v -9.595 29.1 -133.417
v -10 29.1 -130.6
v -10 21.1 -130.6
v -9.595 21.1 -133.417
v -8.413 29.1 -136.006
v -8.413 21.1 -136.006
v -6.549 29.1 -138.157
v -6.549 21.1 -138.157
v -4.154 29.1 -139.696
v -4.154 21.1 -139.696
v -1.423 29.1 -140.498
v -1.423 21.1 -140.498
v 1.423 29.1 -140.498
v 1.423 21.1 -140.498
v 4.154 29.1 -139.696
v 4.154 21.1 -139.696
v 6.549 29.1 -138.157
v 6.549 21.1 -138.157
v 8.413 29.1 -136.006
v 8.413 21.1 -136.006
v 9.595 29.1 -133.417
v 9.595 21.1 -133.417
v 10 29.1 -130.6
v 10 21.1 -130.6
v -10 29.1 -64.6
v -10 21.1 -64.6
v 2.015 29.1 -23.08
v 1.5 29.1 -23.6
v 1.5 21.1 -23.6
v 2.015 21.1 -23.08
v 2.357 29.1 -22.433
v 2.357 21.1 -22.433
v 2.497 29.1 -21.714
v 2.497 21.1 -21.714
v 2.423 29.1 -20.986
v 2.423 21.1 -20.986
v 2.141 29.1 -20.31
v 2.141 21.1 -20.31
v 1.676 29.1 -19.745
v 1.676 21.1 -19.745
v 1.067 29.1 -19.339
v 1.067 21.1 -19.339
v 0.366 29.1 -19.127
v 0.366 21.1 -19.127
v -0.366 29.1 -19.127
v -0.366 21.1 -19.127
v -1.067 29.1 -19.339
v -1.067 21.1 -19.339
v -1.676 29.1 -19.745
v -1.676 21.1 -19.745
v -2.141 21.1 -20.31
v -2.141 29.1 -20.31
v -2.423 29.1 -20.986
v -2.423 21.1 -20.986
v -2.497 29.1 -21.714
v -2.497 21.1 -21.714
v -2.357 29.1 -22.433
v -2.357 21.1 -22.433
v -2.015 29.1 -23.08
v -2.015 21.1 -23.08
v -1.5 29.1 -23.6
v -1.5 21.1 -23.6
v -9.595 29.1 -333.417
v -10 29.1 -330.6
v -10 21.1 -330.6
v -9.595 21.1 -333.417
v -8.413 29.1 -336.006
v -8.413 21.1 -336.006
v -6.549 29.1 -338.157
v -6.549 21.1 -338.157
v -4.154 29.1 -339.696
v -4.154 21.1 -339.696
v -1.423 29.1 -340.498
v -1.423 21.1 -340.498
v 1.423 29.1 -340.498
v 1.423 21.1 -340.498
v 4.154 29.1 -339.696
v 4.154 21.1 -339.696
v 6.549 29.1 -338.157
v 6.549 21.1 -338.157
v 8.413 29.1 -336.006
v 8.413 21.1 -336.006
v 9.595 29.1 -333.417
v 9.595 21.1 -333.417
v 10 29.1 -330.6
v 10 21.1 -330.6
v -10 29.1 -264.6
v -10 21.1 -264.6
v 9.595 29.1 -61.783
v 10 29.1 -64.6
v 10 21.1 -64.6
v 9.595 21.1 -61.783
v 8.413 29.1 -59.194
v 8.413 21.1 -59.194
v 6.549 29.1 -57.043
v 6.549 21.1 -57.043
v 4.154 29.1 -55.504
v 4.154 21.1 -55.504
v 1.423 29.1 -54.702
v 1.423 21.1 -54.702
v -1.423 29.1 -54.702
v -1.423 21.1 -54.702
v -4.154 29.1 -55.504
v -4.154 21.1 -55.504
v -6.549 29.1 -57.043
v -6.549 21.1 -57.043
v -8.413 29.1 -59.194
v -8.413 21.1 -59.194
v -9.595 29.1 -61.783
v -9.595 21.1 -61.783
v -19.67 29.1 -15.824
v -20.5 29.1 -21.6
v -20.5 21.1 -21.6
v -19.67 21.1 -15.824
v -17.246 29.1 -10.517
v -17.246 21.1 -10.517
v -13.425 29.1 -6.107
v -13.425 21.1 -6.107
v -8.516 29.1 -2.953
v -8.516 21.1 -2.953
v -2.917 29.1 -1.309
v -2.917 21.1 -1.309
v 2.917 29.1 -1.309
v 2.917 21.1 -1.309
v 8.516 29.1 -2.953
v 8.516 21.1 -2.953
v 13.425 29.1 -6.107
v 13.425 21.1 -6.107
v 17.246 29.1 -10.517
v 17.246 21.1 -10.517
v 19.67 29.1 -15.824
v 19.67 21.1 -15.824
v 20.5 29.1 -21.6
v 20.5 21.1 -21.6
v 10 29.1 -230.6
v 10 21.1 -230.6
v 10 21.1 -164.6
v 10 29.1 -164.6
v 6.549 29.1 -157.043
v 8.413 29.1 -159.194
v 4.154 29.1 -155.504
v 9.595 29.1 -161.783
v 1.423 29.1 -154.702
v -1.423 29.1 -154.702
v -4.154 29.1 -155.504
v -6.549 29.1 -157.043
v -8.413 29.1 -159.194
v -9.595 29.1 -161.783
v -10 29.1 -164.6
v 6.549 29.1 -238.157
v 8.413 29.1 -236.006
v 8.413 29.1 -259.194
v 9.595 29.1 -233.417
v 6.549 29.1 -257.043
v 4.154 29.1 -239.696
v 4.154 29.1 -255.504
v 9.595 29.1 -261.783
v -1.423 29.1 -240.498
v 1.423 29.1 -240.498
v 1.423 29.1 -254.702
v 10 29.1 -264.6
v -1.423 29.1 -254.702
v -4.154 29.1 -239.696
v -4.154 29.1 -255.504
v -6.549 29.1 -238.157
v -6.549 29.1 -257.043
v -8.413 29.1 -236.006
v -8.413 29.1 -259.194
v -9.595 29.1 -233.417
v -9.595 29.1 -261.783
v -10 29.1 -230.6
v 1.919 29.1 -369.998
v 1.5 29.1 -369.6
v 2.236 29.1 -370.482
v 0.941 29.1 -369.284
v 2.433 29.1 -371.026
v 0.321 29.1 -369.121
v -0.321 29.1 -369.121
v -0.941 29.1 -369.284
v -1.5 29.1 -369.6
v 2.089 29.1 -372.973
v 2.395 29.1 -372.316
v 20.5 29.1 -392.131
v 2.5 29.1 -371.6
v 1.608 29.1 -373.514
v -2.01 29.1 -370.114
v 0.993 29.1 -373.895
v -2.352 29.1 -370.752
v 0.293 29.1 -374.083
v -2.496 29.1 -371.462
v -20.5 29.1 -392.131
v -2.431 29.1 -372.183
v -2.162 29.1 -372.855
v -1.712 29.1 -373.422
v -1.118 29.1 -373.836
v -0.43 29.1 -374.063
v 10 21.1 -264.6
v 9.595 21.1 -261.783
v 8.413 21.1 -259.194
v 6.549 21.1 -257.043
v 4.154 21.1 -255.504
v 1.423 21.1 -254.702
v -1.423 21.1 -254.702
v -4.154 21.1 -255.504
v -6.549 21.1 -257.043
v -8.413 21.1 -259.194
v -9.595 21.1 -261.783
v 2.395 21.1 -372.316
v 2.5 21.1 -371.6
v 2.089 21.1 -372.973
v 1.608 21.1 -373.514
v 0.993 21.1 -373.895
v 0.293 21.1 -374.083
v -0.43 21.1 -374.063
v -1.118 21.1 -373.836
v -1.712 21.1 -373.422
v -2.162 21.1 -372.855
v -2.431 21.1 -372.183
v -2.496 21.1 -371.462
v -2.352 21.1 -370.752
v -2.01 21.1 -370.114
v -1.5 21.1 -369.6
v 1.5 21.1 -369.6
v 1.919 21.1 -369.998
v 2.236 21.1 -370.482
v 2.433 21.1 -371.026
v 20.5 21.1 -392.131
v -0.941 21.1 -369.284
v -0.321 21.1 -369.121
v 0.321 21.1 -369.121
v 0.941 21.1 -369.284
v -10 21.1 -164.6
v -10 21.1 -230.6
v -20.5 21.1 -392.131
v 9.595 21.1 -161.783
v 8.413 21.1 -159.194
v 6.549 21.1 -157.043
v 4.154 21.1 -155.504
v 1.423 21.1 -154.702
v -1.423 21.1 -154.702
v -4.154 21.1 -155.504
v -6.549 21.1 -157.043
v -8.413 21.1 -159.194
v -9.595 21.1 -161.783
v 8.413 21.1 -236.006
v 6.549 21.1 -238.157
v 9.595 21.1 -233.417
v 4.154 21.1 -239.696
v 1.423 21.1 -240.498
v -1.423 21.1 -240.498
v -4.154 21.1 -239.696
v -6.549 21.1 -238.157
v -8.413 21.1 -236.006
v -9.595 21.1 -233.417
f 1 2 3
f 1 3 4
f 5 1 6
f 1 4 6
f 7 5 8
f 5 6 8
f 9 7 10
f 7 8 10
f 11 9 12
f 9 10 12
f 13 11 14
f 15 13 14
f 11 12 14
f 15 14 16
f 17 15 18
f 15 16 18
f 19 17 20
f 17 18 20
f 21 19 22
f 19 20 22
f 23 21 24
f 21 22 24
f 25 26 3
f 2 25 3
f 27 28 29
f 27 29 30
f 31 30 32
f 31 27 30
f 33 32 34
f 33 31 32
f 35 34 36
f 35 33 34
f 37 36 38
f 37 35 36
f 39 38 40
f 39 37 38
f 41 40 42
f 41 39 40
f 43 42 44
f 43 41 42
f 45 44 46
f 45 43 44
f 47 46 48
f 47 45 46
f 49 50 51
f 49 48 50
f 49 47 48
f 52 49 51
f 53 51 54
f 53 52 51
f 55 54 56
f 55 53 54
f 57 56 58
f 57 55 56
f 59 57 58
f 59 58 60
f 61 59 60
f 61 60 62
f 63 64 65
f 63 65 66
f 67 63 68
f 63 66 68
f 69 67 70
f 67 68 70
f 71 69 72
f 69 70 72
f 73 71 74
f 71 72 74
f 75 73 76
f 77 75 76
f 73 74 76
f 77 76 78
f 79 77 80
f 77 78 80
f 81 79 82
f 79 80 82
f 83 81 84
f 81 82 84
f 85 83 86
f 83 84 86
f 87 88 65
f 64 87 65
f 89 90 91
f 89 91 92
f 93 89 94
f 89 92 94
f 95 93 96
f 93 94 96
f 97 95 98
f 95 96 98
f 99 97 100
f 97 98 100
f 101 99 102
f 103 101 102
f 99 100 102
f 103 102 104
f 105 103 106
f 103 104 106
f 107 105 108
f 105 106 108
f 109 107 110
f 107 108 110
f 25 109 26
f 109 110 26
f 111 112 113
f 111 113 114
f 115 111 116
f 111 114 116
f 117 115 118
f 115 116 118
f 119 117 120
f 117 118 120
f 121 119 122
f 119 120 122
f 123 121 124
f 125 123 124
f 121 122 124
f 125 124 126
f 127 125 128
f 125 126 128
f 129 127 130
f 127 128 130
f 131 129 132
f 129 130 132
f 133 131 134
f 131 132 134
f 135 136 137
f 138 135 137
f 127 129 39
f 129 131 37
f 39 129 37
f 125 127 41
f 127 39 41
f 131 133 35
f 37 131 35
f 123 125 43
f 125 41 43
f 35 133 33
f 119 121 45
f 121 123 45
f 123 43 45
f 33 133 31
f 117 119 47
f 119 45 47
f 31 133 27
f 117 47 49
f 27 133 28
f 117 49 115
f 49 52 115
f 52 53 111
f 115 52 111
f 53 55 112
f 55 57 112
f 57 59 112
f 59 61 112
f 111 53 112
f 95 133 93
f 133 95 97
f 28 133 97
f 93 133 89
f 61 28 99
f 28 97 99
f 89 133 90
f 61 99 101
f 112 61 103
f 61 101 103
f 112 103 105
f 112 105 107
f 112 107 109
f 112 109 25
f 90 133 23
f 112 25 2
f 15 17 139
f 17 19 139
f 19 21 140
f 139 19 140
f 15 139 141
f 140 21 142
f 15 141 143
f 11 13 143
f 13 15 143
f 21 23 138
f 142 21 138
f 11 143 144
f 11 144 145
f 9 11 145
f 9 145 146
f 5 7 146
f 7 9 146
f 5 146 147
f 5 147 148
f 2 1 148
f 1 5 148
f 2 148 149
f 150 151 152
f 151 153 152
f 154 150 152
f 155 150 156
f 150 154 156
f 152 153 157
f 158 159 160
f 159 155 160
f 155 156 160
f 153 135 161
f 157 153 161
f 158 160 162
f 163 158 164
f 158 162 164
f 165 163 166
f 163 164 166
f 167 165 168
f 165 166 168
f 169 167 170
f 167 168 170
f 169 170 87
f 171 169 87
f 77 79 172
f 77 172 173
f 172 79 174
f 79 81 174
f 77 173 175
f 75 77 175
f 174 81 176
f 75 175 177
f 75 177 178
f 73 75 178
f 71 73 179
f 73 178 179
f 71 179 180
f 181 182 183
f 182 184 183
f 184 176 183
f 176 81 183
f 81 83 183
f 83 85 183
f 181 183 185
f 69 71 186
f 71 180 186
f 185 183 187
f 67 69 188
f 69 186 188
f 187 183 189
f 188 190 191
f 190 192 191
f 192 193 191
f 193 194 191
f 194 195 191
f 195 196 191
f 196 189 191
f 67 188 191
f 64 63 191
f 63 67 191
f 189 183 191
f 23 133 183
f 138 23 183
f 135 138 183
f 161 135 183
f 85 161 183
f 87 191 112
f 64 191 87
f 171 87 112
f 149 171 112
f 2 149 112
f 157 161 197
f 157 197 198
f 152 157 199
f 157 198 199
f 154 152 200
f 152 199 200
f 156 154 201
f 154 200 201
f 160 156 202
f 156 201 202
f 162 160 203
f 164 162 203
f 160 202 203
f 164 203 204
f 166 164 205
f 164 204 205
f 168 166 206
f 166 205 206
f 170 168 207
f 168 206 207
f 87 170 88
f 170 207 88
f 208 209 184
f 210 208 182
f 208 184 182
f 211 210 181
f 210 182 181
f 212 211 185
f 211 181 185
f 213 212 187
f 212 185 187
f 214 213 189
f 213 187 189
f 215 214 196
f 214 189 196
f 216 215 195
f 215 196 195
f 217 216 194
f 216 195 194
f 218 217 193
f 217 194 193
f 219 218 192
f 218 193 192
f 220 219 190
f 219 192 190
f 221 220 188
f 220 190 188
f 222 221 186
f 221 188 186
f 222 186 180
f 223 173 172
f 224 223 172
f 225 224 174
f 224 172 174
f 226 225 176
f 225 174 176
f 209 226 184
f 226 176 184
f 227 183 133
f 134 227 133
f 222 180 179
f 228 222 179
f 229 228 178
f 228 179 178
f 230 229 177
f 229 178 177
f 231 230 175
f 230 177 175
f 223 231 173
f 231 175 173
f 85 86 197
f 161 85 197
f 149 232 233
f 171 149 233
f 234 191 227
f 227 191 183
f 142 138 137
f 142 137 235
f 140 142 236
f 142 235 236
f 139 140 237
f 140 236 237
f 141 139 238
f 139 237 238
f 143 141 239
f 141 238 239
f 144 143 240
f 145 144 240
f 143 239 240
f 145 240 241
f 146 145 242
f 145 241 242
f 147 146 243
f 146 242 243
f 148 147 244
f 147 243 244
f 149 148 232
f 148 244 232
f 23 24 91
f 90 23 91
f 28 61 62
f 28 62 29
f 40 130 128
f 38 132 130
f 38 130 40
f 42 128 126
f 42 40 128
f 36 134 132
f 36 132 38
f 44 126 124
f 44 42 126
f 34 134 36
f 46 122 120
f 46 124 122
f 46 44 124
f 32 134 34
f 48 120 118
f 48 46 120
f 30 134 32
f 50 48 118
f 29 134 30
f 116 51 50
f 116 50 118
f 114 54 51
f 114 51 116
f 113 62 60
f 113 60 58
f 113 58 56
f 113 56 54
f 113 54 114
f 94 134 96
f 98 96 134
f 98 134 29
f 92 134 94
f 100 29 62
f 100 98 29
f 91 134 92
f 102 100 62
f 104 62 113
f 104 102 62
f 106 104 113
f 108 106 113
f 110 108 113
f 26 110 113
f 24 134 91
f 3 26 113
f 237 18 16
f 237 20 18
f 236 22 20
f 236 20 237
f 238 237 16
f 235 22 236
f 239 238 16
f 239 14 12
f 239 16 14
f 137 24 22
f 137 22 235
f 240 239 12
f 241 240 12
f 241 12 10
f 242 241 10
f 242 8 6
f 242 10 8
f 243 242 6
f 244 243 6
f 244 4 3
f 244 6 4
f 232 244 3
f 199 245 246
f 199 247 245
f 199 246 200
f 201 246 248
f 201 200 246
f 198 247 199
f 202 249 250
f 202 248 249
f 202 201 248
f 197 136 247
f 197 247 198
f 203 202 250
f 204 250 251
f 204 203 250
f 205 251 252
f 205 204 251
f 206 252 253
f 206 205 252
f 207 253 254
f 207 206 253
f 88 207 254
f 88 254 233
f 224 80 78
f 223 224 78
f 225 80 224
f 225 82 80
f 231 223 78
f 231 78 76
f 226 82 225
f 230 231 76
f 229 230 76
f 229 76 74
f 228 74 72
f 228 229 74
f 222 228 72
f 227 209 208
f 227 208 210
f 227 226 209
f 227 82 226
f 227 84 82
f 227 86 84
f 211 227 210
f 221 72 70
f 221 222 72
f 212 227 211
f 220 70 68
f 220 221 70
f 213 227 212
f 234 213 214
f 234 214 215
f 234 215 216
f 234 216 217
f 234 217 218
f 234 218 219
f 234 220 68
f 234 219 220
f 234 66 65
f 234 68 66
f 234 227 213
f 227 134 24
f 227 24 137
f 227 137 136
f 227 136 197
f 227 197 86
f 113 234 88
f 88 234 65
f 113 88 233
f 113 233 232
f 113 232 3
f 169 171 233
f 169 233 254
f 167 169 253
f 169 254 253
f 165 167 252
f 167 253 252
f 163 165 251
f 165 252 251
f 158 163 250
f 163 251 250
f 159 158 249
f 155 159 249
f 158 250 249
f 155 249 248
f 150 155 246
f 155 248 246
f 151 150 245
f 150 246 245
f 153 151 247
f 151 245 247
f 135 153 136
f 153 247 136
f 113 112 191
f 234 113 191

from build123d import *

# Parameters (mm, degrees)
ZAPAS_CZ_1_0_1_START        = 21.1
ZAPAS_CZ_1_0_1_DEPTH        = 8
WYTNIJ_WYCI_GNI_CIE1_DEPTH  = 393.717022804
DODANIE_WYCI_GNI_CIE1_DEPTH = 8


# Read off the part's stored shape, not the designer's step: Zapas-Część1.0-1
with BuildPart() as part:
    # Zapas-Część1.0-1 outline → Zapas-Część1.0-1 (new body)
    with BuildSketch(Plane(origin=(0, 0, 0), x_dir=(1, 0, 0), z_dir=(0, 1, 0)).offset(ZAPAS_CZ_1_0_1_START)):
        with BuildLine():
            ThreePointArc((-20.5, 21.6), (0, 1.1), (20.5, 21.6))
            Line((20.5, 21.6), (20.5, 371.6))
            ThreePointArc((20.5, 371.6), (0, 392.1), (-20.5, 371.6))
            Line((-20.5, 371.6), (-20.5, 21.6))
        make_face()
        with BuildLine():
            Line((-10, 64.6), (-10, 130.6))
            ThreePointArc((-10, 130.6), (0, 140.6), (10, 130.6))
            Line((10, 130.6), (10, 64.6))
            ThreePointArc((10, 64.6), (0, 54.6), (-10, 64.6))
        make_face(mode=Mode.SUBTRACT)
        with BuildLine():
            Line((-10, 164.6), (-10, 230.6))
            ThreePointArc((-10, 230.6), (0, 240.6), (10, 230.6))
            Line((10, 230.6), (10, 164.6))
            ThreePointArc((10, 164.6), (0, 154.6), (-10, 164.6))
        make_face(mode=Mode.SUBTRACT)
        with BuildLine():
            Line((-10, 264.6), (-10, 330.6))
            ThreePointArc((-10, 330.6), (0, 340.6), (10, 330.6))
            Line((10, 330.6), (10, 264.6))
            ThreePointArc((10, 264.6), (0, 254.6), (-10, 264.6))
        make_face(mode=Mode.SUBTRACT)
    extrude(amount=ZAPAS_CZ_1_0_1_DEPTH)

    # Szkic1 → Wytnij-wyciągnięcie1 (cut, through all)
    with BuildSketch(Plane(origin=(0, 29.1, 0), x_dir=(1, 0, 0), z_dir=(0, 1, 0))):
        with BuildLine():
            Line((-1.5, 23.6), (1.5, 23.6))
            ThreePointArc((1.5, 23.6), (0, 19.1), (-1.5, 23.6))
        make_face()
        with BuildLine():
            ThreePointArc((2.5, 371.6), (-1.118033989, 373.836067977), (-1.5, 369.6))
            ThreePointArc((-1.5, 369.6), (0, 369.1), (1.5, 369.6))
            ThreePointArc((1.5, 369.6), (2.236067977, 370.481966011), (2.5, 371.6))
        make_face()
    extrude(amount=-WYTNIJ_WYCI_GNI_CIE1_DEPTH, mode=Mode.SUBTRACT)

    # Szkic2 → Dodanie-wyciągnięcie1 (add)
    with BuildSketch(Plane(origin=(0, 29.1, 0), x_dir=(1, 0, 0), z_dir=(0, 1, 0))):
        with BuildLine():
            Line((-20.5, 371.6), (-20.5, 392.131331169))
            Line((-20.5, 392.131331169), (20.5, 392.131331169))
            Line((20.5, 392.131331169), (20.5, 371.6))
            Line((20.5, 371.6), (3.983153472, 371.6))
            Line((3.983153472, 371.6), (2.5, 371.6))
            ThreePointArc((2.5, 371.6), (0, 374.1), (-2.5, 371.6))
            Line((-2.5, 371.6), (-20.5, 371.6))
        make_face()
    extrude(amount=-DODANIE_WYCI_GNI_CIE1_DEPTH)


solid = part.part
